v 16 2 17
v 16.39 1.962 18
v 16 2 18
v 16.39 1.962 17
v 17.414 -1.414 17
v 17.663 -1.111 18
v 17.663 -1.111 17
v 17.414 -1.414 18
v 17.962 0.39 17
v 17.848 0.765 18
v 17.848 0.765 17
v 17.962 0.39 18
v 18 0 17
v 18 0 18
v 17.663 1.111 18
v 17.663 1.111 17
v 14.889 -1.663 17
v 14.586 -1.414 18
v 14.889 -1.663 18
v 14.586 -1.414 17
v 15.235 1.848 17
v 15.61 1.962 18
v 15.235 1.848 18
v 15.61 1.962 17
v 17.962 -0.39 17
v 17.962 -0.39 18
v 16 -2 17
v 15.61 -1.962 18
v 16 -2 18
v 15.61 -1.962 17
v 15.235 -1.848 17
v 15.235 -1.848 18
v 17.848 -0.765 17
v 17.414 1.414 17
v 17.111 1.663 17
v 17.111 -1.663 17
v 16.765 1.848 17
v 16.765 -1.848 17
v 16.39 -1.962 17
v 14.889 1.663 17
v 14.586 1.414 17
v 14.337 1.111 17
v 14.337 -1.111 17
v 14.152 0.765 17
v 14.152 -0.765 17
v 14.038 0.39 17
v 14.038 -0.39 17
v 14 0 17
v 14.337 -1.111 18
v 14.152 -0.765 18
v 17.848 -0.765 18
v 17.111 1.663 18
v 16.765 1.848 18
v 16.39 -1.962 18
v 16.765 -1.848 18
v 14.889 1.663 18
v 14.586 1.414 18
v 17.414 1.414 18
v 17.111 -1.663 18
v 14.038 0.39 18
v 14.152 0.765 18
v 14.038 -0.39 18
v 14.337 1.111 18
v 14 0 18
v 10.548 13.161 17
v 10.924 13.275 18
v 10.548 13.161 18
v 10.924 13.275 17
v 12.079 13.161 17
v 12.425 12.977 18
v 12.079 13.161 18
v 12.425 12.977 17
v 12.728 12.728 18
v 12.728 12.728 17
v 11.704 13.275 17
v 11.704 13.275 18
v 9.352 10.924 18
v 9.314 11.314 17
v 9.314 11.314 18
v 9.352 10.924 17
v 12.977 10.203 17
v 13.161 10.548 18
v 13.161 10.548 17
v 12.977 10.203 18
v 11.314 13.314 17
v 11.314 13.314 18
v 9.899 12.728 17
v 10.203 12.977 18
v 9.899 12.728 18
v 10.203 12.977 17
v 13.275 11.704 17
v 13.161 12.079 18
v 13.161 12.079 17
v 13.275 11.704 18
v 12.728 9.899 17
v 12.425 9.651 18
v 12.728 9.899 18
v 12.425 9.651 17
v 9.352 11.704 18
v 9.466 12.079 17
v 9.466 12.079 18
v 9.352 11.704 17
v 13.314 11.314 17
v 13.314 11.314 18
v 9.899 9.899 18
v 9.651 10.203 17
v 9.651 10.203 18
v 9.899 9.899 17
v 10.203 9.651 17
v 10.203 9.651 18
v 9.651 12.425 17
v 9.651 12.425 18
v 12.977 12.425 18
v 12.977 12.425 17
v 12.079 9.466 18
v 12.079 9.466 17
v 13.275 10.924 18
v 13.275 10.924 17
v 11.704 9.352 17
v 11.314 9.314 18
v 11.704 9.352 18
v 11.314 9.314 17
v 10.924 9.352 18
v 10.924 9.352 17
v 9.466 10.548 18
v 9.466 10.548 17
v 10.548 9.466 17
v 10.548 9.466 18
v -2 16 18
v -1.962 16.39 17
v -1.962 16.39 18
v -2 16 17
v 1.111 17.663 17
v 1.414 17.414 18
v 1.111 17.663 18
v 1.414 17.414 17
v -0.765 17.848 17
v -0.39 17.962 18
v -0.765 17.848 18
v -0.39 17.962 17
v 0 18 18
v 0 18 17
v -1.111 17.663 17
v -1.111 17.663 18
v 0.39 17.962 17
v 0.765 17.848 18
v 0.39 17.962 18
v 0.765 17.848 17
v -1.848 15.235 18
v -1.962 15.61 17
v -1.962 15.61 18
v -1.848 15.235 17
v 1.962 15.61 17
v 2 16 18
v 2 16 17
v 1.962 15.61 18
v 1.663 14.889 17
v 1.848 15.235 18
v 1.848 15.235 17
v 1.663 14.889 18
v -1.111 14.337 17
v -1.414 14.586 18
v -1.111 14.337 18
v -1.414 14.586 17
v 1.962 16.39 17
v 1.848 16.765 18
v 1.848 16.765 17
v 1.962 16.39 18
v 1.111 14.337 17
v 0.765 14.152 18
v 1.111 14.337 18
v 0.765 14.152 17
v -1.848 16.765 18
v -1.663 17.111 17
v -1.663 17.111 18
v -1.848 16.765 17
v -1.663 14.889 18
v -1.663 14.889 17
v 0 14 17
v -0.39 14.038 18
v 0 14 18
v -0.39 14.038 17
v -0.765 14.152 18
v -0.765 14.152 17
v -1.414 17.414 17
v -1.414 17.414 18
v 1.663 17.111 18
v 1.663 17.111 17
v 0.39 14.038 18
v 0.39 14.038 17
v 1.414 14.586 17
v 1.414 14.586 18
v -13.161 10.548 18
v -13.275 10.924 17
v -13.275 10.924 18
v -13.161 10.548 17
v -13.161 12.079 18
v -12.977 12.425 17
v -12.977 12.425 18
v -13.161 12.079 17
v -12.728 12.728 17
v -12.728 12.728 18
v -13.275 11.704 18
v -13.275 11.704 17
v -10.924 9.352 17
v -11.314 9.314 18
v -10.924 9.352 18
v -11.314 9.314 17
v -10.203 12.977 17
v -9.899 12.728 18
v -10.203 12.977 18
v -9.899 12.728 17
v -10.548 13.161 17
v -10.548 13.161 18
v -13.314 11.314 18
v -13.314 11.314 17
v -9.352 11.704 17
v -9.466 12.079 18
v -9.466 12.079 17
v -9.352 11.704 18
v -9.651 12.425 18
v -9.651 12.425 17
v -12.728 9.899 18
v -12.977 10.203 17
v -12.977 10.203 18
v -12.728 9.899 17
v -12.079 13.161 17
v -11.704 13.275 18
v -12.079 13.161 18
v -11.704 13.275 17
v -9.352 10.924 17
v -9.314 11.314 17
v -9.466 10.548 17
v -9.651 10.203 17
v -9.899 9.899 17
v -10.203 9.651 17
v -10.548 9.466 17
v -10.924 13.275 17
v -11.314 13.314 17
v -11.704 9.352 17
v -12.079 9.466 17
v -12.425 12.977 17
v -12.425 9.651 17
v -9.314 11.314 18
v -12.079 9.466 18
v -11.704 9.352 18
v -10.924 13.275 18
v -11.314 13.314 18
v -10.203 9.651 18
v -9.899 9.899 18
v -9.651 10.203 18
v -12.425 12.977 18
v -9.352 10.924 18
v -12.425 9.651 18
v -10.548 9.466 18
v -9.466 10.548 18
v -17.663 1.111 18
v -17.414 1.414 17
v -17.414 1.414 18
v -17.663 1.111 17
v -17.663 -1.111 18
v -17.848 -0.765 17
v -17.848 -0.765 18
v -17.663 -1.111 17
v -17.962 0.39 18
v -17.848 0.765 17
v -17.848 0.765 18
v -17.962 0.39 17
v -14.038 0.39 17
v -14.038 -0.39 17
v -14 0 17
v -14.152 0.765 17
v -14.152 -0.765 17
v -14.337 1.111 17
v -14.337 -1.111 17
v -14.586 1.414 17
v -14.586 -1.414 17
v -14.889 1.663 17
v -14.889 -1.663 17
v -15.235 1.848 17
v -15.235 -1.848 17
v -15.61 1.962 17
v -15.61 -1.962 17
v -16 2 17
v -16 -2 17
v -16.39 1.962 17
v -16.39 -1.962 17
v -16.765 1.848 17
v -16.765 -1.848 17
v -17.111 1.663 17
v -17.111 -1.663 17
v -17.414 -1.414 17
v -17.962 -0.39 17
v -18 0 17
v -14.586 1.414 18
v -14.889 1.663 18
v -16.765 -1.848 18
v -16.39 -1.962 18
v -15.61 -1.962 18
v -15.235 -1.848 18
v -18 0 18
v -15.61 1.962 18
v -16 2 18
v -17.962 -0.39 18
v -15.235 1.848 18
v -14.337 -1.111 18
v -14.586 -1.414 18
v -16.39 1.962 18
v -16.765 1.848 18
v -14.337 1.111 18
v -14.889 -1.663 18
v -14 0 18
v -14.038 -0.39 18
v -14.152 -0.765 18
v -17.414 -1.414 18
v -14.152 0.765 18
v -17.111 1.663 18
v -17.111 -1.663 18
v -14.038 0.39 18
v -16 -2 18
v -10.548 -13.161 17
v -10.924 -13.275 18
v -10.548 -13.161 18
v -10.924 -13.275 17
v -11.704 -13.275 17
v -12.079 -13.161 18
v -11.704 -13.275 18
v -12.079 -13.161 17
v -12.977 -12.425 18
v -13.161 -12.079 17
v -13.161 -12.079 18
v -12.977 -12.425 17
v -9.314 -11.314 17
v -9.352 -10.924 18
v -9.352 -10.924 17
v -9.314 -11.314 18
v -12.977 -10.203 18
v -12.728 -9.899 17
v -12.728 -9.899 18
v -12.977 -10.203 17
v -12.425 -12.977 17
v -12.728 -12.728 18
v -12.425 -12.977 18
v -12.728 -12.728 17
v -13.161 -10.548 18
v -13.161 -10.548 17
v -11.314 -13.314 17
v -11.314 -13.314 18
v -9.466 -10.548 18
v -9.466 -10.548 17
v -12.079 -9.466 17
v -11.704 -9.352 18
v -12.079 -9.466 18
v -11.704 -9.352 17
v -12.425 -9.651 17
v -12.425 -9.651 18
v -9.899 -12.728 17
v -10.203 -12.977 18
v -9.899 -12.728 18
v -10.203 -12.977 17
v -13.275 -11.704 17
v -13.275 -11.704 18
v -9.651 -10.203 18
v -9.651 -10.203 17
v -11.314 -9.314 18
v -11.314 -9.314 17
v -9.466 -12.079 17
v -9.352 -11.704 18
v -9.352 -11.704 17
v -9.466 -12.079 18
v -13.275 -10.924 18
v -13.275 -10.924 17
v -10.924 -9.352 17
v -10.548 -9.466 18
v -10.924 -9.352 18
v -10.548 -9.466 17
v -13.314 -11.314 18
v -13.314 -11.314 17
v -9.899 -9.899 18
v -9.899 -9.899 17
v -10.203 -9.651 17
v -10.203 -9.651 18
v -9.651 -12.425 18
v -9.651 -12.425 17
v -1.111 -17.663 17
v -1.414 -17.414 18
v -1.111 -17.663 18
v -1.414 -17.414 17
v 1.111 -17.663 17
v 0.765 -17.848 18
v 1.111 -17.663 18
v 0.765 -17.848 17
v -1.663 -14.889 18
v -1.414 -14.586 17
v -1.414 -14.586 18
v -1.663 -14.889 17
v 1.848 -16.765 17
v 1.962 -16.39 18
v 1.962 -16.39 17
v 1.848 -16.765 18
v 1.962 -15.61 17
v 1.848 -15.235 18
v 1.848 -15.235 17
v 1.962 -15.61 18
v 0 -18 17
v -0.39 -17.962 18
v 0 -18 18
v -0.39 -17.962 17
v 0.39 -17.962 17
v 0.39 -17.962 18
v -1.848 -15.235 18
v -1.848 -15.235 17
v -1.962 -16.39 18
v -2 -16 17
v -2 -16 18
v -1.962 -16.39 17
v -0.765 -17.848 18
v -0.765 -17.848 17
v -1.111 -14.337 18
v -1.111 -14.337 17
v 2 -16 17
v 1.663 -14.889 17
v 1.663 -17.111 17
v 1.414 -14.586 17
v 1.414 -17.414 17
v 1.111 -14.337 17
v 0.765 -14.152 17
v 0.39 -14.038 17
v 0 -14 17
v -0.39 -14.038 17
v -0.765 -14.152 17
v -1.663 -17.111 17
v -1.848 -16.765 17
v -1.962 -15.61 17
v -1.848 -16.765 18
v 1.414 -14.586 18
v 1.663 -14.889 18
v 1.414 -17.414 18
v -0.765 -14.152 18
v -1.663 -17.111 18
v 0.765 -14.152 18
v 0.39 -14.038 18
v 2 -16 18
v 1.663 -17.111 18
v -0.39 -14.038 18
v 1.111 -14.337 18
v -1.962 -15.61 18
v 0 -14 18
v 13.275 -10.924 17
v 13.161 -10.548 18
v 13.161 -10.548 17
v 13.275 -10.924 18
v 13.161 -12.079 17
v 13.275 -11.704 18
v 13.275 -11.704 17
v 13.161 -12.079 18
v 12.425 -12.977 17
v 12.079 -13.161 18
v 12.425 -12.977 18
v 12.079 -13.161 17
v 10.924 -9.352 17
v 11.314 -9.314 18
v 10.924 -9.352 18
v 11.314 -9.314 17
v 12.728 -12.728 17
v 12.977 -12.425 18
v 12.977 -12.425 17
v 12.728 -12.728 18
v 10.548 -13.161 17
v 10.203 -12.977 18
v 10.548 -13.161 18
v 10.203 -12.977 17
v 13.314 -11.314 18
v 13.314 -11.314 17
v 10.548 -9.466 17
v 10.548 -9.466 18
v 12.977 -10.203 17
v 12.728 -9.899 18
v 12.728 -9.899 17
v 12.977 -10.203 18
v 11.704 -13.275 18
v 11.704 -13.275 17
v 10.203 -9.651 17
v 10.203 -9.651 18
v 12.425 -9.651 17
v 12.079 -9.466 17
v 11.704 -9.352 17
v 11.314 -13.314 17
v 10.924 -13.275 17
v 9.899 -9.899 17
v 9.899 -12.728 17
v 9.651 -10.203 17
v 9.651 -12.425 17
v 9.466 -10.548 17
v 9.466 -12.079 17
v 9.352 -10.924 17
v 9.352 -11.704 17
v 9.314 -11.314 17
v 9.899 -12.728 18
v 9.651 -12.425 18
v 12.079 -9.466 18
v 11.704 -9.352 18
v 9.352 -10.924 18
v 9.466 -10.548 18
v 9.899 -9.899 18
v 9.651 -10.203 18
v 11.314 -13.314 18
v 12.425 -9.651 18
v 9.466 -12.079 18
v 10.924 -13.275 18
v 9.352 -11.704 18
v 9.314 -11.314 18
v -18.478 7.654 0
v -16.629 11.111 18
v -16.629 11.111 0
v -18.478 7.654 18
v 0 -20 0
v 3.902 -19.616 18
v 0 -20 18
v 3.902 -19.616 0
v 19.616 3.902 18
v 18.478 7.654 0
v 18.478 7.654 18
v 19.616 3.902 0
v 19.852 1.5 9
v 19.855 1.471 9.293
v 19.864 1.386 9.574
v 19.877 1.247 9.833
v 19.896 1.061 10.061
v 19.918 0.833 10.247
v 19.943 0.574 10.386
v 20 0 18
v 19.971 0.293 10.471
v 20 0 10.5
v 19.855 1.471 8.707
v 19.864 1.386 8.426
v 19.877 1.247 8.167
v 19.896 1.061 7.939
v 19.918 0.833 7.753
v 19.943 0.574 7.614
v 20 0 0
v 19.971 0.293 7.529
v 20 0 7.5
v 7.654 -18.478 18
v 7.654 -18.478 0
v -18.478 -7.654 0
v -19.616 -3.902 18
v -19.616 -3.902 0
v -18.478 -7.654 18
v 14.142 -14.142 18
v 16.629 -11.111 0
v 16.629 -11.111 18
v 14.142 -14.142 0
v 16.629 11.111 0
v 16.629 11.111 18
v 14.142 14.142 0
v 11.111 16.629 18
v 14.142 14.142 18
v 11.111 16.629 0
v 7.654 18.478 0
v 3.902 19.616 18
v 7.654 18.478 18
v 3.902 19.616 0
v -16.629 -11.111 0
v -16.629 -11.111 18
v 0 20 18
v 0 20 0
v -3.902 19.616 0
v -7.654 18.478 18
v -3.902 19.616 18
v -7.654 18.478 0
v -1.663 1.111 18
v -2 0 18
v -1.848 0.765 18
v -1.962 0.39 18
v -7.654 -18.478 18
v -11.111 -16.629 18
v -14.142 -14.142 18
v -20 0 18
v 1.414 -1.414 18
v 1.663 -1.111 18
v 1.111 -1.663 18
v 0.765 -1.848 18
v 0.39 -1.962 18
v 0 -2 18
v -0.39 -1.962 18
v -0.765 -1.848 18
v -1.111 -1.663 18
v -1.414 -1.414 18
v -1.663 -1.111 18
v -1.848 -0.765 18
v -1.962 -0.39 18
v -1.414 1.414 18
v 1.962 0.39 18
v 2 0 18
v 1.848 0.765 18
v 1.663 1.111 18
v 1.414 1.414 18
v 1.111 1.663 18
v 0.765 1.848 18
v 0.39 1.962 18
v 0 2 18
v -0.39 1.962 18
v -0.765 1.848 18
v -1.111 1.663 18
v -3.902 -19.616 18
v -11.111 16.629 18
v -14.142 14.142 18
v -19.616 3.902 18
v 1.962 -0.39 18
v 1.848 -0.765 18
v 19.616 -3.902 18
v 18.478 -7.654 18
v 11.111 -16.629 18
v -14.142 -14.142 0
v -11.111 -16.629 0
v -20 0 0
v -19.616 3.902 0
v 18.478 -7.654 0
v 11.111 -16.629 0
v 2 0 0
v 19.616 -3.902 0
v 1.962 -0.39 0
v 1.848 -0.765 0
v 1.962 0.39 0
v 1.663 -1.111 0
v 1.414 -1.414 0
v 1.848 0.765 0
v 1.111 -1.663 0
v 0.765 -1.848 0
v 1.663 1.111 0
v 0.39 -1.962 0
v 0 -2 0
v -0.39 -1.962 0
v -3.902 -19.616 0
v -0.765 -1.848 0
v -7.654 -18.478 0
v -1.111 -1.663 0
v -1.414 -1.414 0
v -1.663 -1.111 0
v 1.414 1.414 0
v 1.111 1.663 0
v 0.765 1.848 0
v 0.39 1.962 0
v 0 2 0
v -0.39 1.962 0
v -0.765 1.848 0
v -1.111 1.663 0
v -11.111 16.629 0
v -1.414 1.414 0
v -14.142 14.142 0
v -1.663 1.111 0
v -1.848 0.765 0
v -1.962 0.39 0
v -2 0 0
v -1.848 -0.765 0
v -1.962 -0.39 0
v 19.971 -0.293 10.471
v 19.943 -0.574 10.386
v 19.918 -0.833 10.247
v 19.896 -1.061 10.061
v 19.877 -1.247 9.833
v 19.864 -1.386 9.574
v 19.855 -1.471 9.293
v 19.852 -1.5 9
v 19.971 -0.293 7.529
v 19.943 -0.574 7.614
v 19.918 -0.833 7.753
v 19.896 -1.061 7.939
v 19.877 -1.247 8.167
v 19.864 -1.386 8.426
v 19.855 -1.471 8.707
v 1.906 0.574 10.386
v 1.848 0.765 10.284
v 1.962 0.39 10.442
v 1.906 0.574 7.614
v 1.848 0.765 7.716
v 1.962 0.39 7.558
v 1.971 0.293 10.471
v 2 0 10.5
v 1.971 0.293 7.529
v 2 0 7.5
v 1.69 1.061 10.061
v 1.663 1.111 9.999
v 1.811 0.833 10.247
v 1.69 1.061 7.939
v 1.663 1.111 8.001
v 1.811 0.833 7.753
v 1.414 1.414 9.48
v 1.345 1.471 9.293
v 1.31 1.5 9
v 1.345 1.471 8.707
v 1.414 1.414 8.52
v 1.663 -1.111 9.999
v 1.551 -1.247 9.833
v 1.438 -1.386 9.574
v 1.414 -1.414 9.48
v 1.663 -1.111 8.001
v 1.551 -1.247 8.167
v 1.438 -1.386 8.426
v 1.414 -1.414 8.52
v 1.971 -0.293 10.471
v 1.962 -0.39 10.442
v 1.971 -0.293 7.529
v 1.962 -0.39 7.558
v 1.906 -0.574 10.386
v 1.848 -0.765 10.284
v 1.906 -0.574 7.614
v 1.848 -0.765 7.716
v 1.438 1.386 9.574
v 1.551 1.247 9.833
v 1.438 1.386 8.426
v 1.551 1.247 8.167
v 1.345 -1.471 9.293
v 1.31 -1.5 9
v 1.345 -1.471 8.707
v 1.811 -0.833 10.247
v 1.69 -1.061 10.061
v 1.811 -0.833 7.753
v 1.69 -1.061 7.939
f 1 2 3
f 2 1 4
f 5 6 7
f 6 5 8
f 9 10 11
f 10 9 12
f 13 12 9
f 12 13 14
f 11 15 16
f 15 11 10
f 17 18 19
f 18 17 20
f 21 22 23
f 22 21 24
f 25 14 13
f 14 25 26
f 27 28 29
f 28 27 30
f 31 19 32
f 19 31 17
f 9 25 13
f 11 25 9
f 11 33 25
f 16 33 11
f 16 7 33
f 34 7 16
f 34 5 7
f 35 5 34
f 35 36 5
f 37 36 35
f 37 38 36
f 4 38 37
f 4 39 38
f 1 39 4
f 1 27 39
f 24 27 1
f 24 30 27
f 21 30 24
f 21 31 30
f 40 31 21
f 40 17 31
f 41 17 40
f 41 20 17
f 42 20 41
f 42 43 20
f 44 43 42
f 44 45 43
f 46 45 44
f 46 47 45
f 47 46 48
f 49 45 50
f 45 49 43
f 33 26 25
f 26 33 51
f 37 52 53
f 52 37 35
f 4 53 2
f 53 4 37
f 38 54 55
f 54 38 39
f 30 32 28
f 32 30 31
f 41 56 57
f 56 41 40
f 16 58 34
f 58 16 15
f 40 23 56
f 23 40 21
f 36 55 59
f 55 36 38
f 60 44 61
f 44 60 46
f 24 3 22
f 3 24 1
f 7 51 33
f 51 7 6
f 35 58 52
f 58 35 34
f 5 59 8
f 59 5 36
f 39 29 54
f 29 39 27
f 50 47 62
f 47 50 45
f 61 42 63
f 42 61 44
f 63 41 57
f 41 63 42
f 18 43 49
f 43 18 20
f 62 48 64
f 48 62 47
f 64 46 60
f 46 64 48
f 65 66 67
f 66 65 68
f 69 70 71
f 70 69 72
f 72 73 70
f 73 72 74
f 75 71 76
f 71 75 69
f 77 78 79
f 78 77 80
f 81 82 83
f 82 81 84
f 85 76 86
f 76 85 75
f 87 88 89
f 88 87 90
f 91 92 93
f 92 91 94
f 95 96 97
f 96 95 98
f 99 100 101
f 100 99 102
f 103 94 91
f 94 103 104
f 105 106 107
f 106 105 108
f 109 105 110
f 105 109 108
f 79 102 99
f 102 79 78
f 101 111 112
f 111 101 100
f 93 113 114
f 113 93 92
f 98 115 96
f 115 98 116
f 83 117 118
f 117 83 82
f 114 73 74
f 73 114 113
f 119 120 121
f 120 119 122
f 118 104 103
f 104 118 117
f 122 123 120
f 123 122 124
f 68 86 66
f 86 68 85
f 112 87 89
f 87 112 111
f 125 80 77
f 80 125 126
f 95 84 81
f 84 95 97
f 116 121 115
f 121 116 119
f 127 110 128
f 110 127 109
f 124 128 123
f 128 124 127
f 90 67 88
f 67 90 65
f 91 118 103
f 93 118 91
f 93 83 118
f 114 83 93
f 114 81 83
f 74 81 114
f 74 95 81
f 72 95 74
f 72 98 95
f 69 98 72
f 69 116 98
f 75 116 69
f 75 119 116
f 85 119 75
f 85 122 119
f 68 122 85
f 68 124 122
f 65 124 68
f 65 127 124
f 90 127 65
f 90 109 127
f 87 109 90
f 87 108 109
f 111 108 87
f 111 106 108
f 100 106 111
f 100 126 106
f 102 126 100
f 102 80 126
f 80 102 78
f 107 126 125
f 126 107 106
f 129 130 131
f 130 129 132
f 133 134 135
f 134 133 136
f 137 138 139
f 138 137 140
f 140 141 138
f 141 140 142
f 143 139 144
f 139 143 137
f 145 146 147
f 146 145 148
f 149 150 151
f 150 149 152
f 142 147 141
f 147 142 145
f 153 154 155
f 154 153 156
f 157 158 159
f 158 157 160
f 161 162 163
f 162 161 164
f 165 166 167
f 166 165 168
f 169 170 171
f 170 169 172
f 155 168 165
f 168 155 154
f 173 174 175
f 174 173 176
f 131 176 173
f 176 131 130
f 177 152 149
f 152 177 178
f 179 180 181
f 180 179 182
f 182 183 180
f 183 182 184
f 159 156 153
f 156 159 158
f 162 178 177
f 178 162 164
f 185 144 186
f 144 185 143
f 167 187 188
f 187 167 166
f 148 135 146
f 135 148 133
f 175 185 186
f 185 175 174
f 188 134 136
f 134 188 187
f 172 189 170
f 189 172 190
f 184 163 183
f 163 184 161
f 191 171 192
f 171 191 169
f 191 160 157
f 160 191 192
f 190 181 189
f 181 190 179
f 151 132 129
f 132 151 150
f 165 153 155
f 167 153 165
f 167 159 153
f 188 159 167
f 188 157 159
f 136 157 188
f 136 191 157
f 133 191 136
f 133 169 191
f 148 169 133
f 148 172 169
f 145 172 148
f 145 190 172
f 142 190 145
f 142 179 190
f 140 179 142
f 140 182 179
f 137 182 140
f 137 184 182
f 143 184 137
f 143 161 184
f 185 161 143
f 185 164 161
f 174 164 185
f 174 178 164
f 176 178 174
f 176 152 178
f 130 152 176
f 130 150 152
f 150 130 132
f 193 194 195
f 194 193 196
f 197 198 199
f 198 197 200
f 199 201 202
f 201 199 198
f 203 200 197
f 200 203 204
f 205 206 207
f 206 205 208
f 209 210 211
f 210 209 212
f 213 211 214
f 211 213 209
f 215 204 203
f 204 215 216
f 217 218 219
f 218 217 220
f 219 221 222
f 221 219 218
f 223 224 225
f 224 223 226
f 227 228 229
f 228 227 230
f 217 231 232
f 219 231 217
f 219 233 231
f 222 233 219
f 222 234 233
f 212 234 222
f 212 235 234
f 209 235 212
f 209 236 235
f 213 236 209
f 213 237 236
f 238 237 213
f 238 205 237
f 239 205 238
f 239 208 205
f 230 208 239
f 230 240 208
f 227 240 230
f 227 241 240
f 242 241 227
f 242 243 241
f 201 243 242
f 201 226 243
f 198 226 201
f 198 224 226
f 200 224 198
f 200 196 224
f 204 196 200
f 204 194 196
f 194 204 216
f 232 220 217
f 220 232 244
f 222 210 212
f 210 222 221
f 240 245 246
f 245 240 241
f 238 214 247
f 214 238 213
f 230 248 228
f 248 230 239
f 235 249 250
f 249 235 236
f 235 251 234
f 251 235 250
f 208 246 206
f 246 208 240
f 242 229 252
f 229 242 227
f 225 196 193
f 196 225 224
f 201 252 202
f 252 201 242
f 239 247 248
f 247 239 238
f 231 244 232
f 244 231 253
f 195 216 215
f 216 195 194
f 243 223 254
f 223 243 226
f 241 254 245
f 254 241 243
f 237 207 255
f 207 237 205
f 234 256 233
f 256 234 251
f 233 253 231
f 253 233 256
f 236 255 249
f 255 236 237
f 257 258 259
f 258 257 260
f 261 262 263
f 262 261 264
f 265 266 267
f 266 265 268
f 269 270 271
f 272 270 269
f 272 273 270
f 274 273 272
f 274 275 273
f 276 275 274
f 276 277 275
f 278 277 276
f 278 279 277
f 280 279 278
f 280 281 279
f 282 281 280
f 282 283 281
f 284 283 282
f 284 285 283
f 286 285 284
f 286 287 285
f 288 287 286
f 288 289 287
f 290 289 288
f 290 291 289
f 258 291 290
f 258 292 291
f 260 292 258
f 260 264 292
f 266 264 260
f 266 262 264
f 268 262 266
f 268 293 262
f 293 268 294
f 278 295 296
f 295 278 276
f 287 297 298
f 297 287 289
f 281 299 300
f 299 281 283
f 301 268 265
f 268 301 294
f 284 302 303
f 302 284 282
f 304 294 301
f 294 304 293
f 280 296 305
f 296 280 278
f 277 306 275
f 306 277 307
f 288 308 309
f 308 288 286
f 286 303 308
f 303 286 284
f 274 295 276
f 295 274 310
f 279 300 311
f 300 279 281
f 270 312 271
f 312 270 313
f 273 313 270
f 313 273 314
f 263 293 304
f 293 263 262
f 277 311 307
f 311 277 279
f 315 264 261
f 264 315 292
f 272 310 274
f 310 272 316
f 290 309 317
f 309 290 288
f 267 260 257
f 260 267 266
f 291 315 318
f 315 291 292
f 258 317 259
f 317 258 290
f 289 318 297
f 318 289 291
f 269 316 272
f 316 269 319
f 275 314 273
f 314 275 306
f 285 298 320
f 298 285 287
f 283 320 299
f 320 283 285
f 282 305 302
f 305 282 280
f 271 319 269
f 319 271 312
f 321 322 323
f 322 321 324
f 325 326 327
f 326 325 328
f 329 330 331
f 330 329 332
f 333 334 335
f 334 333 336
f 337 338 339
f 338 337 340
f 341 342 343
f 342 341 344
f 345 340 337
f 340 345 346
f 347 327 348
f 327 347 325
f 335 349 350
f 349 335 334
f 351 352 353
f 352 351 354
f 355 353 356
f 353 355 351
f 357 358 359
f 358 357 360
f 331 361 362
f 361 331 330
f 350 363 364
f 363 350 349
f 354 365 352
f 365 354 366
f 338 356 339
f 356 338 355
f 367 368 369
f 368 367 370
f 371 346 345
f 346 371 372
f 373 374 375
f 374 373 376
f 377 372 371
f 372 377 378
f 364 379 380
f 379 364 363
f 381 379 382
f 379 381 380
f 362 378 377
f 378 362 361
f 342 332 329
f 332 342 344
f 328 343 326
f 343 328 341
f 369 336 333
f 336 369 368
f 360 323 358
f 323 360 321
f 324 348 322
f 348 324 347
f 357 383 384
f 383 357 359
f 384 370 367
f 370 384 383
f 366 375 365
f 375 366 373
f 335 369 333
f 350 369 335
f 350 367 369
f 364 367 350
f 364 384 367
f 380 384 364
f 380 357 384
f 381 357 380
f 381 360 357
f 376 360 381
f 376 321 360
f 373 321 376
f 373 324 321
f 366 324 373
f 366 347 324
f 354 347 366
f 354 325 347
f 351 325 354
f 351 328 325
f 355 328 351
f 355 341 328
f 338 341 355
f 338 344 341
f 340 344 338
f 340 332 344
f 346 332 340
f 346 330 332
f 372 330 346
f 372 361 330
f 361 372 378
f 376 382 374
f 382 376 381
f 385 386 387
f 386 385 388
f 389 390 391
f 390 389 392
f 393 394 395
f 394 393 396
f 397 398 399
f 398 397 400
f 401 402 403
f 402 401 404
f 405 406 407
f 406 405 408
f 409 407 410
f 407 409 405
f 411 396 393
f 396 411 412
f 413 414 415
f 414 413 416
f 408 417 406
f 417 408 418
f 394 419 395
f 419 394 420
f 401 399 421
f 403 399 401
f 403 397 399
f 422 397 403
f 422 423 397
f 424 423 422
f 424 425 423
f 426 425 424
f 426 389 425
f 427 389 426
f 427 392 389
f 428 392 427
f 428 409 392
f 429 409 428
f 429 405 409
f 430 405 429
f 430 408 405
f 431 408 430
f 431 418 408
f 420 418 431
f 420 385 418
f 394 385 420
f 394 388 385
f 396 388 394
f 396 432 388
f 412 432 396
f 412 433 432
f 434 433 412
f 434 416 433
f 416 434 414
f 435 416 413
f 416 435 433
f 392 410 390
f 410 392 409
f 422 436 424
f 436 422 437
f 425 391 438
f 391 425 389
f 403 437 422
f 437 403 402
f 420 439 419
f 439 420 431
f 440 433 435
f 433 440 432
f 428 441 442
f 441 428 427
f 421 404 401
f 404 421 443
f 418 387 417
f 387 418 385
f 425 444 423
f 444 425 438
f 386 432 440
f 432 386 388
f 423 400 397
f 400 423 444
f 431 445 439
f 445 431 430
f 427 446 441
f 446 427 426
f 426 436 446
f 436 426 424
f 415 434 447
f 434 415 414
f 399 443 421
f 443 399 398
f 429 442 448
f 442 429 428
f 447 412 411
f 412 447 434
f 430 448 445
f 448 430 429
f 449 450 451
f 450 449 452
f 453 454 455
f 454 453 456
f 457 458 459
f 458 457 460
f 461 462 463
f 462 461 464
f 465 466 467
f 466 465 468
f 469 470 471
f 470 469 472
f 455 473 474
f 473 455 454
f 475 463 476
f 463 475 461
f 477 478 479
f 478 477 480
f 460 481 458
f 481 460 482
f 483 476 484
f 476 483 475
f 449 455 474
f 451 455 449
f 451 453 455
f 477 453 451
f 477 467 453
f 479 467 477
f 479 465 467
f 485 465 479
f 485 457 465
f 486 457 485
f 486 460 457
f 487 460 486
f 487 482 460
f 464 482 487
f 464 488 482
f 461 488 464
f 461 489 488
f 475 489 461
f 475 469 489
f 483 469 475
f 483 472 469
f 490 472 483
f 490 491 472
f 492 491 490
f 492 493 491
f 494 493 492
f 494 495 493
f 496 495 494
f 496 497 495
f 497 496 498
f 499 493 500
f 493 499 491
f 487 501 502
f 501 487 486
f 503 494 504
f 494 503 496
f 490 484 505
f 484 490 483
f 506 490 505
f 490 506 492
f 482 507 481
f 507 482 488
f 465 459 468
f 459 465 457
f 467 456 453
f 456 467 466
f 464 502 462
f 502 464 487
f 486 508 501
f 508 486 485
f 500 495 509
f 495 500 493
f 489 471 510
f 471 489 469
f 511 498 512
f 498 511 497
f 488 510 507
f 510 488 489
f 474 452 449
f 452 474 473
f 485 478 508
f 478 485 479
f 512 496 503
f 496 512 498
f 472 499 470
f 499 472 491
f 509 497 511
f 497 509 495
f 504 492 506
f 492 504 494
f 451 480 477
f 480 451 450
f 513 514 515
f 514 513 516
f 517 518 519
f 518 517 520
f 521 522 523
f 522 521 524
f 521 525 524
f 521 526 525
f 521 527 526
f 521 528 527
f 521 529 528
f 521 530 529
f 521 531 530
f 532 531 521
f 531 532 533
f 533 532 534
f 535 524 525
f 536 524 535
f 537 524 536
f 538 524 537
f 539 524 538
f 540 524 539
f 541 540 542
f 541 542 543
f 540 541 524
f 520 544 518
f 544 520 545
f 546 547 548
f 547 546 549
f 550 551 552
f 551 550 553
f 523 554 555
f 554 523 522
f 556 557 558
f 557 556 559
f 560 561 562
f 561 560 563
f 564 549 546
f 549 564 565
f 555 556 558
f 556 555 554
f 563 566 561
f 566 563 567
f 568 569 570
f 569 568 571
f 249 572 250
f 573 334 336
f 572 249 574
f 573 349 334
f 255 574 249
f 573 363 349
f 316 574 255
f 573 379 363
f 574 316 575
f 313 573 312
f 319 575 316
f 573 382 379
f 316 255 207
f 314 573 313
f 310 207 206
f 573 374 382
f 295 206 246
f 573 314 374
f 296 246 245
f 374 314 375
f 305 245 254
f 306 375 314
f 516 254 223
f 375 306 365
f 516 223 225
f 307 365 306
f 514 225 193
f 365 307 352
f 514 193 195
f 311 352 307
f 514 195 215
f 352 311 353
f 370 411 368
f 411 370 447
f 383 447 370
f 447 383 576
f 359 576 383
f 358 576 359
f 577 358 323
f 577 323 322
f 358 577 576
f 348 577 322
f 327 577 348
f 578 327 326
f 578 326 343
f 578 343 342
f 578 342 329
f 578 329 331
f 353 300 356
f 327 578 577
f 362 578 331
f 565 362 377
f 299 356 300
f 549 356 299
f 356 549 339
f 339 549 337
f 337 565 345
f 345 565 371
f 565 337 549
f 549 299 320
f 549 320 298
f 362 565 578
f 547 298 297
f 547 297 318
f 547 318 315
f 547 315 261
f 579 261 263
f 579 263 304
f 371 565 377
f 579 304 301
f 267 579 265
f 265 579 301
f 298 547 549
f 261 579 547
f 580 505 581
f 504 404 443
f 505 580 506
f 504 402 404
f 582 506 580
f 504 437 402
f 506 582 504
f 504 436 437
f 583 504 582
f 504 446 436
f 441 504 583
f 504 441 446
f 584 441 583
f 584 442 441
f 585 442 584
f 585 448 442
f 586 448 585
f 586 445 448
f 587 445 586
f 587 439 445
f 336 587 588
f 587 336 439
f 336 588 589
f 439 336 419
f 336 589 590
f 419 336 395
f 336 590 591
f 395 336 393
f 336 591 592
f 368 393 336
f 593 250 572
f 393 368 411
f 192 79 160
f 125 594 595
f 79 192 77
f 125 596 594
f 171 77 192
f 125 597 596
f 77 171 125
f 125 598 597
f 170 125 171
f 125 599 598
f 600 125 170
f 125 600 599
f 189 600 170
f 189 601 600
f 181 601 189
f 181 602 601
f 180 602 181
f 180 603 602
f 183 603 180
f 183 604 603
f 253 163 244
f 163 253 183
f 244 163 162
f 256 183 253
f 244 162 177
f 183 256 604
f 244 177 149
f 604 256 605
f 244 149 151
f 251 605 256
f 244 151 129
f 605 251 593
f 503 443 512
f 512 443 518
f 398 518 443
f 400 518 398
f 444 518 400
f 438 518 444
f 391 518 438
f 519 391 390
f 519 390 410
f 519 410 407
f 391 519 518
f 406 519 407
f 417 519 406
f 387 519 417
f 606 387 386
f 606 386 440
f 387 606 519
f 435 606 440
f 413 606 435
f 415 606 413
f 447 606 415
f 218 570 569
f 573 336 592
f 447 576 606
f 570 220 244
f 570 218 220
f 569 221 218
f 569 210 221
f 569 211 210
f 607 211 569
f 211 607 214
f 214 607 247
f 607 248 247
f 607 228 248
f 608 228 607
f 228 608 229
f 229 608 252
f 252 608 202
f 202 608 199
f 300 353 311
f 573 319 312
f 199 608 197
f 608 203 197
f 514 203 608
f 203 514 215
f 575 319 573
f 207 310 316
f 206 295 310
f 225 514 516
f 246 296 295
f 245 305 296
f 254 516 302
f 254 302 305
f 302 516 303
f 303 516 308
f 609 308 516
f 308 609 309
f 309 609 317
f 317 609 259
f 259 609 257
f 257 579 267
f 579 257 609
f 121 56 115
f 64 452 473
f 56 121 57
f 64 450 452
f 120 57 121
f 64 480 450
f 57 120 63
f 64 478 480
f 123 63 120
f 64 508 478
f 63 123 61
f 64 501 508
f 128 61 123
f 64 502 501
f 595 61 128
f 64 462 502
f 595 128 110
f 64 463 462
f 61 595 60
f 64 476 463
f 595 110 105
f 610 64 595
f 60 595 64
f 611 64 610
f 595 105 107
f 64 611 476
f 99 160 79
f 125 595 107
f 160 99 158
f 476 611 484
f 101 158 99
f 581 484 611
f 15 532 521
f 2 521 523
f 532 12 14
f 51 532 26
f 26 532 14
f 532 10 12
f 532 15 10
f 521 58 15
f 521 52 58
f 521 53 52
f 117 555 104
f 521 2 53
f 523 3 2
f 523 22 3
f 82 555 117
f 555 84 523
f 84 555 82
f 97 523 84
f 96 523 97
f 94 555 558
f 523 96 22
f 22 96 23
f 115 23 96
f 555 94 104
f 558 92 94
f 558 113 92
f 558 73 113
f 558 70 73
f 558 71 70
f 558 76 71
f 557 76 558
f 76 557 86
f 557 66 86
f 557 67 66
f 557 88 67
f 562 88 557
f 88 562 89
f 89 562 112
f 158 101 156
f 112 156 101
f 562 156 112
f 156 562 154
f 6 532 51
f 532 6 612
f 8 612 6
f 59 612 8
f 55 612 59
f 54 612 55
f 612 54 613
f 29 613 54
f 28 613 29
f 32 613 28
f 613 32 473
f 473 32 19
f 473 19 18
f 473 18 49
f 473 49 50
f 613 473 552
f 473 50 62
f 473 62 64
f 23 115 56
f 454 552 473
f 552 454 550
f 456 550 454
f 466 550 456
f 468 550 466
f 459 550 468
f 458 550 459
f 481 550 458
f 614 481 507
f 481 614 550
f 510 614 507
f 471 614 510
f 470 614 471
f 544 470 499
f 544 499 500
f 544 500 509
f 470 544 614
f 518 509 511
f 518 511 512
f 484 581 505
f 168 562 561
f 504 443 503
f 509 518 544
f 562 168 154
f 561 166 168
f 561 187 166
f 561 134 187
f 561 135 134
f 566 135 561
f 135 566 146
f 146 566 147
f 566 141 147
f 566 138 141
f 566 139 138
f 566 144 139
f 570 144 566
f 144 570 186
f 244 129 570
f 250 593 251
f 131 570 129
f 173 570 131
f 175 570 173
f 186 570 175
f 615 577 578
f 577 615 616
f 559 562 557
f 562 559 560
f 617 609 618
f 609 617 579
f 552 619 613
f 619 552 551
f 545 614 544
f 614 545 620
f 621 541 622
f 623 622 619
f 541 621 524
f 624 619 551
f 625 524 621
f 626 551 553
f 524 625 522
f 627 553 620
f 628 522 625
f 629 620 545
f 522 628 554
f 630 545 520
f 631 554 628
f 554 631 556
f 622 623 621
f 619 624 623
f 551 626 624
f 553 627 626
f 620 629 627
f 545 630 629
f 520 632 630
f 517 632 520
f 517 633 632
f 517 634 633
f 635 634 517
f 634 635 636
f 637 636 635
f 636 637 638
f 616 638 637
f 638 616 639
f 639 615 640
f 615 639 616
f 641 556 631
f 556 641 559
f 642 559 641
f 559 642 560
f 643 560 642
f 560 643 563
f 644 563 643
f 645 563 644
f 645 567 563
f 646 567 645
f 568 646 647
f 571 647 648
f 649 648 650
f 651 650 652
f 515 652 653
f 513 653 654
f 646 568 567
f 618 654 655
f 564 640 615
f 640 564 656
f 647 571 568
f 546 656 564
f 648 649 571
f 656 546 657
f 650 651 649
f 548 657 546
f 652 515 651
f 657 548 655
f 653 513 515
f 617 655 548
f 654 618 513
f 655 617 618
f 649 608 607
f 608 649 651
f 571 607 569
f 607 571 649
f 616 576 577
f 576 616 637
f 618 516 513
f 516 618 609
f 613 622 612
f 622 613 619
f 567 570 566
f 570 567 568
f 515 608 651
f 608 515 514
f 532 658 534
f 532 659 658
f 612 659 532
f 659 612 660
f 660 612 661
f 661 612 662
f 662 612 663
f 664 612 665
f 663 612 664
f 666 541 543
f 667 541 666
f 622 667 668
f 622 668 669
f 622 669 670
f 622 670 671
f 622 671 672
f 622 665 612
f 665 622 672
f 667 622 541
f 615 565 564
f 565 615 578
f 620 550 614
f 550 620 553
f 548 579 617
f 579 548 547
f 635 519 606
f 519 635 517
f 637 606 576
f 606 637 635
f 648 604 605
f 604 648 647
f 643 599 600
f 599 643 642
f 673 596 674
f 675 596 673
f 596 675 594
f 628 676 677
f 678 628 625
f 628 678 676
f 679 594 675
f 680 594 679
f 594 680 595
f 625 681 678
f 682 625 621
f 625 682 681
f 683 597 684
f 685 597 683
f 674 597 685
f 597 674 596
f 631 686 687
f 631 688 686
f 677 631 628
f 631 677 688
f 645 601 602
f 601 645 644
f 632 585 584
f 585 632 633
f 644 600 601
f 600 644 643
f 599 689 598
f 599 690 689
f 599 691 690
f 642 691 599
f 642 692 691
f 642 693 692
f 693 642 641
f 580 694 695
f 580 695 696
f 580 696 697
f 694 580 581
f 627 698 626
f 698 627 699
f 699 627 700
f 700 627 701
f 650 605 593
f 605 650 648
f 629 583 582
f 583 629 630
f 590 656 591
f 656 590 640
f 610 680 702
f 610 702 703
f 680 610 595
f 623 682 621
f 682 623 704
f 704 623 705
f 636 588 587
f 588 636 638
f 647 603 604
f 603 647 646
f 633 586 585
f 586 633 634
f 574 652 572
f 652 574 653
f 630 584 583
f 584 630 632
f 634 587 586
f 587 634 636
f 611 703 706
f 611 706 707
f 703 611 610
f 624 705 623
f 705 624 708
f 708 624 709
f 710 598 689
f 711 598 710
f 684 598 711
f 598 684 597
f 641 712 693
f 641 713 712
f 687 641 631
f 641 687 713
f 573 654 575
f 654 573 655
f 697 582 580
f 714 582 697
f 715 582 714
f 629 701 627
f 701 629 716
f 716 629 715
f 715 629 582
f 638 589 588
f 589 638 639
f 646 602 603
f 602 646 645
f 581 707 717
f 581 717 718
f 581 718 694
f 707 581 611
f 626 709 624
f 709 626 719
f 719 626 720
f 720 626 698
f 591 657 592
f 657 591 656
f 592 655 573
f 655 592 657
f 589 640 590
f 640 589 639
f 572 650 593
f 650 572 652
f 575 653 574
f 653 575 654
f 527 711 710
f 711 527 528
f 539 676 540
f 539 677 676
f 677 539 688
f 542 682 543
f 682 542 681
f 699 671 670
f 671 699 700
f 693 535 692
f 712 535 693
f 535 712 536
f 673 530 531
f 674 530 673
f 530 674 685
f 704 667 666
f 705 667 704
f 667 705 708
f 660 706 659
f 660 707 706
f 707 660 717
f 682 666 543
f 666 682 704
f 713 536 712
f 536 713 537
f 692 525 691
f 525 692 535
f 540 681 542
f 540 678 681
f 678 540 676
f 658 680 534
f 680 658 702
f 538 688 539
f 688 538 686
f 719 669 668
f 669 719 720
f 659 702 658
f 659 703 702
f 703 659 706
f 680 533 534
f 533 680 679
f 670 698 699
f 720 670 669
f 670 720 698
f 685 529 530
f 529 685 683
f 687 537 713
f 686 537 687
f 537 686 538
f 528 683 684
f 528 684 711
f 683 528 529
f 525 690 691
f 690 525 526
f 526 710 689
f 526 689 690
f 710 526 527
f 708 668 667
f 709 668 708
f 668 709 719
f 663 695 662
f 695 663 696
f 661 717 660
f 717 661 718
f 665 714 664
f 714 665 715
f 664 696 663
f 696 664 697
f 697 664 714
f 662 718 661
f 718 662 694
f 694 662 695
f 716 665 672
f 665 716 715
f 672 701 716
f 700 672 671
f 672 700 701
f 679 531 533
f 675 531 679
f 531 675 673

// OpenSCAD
$fn = 32;

// ----------------------------------------------------------------------
// Control knob: dimpled knob
// ----------------------------------------------------------------------

// --- parameters (mm) ---
dimp_d = 4;               // finger dimple diameter
n_dimp = 8;               // number of dimples
dimp_r = 16;              // dimple ring radius
knob_d = 40;              // knob body diameter
knob_h = 18;              // knob body height
bore_d = 4;               // shaft bore diameter
set_d = 3;                // set screw bore diameter
fit_tol = 0.1;            // tolerance for press fits, mm
free_tol = 0.5;           // tolerance for clearance fits, mm

dimp_step = 360 / n_dimp;  // dimple angular step

difference() {
  cylinder(h = knob_h, d = knob_d);
  translate([0, 0, -1]) cylinder(h = knob_h + 2, d = bore_d);
  translate([-1, 0, knob_h / 2]) rotate([0, 90, 0])
    cylinder(h = knob_d / 2 + bore_d / 2 + 2, d = set_d);  for (i = [0 : n_dimp - 1])
    rotate([0, 0, i * dimp_step])
      translate([dimp_r, 0, knob_h - 1])
        cylinder(h = 2, d = dimp_d);
}
